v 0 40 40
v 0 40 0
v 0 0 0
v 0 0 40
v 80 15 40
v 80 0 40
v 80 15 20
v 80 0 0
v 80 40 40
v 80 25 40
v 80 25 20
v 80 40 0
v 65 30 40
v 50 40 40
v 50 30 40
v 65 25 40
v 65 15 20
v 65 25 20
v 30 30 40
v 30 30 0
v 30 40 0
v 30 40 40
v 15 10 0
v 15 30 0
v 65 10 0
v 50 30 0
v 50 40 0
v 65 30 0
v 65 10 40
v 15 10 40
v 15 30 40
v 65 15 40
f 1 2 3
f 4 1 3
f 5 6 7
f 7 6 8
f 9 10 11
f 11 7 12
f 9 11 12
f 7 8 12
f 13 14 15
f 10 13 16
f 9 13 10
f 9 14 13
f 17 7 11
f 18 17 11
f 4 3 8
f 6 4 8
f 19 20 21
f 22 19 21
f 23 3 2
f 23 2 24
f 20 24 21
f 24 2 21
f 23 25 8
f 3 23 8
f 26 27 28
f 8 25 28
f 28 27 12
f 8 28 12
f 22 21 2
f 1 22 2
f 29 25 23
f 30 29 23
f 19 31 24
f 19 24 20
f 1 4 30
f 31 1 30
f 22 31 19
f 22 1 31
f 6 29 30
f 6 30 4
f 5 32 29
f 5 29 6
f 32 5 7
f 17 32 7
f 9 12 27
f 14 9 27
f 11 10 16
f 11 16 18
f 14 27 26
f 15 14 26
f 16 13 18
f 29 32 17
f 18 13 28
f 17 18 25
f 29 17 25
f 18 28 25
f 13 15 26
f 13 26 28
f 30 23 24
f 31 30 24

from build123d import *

# Parameters (mm, degrees)
BOSS_EXTRUDE1_DEPTH = 40
CUT_EXTRUDE1_REACH  = 99.98
SKETCH2_W           = 20
SKETCH2_H           = 10


with BuildPart() as part:
    # Sketch1 → Boss-Extrude1 (new body)
    with BuildSketch(Plane.XY):
        Polygon((0, 40), (0, 0), (80, 0), (80, 40), (50, 40), (50, 30), (65, 30), (65, 10), (15, 10), (15, 30), (30, 30), (30, 40), align=None)
    extrude(amount=BOSS_EXTRUDE1_DEPTH)

    # Sketch2 → Cut-Extrude1 (cut, up to next)
    with BuildSketch(Plane(origin=(80, 0, 0), x_dir=(0, 0, -1), z_dir=(1, 0, 0)), mode=Mode.PRIVATE) as cut_extrude1_sk1:
        with Locations((-30, 20)):
            Rectangle(SKETCH2_W, SKETCH2_H)
    cut_extrude1_tool1 = extrude(cut_extrude1_sk1.sketch, amount=-CUT_EXTRUDE1_REACH, mode=Mode.PRIVATE) & part.part
    add(cut_extrude1_tool1.solids().sort_by_distance((80, 20, 30))[0], mode=Mode.SUBTRACT)


solid = part.part
